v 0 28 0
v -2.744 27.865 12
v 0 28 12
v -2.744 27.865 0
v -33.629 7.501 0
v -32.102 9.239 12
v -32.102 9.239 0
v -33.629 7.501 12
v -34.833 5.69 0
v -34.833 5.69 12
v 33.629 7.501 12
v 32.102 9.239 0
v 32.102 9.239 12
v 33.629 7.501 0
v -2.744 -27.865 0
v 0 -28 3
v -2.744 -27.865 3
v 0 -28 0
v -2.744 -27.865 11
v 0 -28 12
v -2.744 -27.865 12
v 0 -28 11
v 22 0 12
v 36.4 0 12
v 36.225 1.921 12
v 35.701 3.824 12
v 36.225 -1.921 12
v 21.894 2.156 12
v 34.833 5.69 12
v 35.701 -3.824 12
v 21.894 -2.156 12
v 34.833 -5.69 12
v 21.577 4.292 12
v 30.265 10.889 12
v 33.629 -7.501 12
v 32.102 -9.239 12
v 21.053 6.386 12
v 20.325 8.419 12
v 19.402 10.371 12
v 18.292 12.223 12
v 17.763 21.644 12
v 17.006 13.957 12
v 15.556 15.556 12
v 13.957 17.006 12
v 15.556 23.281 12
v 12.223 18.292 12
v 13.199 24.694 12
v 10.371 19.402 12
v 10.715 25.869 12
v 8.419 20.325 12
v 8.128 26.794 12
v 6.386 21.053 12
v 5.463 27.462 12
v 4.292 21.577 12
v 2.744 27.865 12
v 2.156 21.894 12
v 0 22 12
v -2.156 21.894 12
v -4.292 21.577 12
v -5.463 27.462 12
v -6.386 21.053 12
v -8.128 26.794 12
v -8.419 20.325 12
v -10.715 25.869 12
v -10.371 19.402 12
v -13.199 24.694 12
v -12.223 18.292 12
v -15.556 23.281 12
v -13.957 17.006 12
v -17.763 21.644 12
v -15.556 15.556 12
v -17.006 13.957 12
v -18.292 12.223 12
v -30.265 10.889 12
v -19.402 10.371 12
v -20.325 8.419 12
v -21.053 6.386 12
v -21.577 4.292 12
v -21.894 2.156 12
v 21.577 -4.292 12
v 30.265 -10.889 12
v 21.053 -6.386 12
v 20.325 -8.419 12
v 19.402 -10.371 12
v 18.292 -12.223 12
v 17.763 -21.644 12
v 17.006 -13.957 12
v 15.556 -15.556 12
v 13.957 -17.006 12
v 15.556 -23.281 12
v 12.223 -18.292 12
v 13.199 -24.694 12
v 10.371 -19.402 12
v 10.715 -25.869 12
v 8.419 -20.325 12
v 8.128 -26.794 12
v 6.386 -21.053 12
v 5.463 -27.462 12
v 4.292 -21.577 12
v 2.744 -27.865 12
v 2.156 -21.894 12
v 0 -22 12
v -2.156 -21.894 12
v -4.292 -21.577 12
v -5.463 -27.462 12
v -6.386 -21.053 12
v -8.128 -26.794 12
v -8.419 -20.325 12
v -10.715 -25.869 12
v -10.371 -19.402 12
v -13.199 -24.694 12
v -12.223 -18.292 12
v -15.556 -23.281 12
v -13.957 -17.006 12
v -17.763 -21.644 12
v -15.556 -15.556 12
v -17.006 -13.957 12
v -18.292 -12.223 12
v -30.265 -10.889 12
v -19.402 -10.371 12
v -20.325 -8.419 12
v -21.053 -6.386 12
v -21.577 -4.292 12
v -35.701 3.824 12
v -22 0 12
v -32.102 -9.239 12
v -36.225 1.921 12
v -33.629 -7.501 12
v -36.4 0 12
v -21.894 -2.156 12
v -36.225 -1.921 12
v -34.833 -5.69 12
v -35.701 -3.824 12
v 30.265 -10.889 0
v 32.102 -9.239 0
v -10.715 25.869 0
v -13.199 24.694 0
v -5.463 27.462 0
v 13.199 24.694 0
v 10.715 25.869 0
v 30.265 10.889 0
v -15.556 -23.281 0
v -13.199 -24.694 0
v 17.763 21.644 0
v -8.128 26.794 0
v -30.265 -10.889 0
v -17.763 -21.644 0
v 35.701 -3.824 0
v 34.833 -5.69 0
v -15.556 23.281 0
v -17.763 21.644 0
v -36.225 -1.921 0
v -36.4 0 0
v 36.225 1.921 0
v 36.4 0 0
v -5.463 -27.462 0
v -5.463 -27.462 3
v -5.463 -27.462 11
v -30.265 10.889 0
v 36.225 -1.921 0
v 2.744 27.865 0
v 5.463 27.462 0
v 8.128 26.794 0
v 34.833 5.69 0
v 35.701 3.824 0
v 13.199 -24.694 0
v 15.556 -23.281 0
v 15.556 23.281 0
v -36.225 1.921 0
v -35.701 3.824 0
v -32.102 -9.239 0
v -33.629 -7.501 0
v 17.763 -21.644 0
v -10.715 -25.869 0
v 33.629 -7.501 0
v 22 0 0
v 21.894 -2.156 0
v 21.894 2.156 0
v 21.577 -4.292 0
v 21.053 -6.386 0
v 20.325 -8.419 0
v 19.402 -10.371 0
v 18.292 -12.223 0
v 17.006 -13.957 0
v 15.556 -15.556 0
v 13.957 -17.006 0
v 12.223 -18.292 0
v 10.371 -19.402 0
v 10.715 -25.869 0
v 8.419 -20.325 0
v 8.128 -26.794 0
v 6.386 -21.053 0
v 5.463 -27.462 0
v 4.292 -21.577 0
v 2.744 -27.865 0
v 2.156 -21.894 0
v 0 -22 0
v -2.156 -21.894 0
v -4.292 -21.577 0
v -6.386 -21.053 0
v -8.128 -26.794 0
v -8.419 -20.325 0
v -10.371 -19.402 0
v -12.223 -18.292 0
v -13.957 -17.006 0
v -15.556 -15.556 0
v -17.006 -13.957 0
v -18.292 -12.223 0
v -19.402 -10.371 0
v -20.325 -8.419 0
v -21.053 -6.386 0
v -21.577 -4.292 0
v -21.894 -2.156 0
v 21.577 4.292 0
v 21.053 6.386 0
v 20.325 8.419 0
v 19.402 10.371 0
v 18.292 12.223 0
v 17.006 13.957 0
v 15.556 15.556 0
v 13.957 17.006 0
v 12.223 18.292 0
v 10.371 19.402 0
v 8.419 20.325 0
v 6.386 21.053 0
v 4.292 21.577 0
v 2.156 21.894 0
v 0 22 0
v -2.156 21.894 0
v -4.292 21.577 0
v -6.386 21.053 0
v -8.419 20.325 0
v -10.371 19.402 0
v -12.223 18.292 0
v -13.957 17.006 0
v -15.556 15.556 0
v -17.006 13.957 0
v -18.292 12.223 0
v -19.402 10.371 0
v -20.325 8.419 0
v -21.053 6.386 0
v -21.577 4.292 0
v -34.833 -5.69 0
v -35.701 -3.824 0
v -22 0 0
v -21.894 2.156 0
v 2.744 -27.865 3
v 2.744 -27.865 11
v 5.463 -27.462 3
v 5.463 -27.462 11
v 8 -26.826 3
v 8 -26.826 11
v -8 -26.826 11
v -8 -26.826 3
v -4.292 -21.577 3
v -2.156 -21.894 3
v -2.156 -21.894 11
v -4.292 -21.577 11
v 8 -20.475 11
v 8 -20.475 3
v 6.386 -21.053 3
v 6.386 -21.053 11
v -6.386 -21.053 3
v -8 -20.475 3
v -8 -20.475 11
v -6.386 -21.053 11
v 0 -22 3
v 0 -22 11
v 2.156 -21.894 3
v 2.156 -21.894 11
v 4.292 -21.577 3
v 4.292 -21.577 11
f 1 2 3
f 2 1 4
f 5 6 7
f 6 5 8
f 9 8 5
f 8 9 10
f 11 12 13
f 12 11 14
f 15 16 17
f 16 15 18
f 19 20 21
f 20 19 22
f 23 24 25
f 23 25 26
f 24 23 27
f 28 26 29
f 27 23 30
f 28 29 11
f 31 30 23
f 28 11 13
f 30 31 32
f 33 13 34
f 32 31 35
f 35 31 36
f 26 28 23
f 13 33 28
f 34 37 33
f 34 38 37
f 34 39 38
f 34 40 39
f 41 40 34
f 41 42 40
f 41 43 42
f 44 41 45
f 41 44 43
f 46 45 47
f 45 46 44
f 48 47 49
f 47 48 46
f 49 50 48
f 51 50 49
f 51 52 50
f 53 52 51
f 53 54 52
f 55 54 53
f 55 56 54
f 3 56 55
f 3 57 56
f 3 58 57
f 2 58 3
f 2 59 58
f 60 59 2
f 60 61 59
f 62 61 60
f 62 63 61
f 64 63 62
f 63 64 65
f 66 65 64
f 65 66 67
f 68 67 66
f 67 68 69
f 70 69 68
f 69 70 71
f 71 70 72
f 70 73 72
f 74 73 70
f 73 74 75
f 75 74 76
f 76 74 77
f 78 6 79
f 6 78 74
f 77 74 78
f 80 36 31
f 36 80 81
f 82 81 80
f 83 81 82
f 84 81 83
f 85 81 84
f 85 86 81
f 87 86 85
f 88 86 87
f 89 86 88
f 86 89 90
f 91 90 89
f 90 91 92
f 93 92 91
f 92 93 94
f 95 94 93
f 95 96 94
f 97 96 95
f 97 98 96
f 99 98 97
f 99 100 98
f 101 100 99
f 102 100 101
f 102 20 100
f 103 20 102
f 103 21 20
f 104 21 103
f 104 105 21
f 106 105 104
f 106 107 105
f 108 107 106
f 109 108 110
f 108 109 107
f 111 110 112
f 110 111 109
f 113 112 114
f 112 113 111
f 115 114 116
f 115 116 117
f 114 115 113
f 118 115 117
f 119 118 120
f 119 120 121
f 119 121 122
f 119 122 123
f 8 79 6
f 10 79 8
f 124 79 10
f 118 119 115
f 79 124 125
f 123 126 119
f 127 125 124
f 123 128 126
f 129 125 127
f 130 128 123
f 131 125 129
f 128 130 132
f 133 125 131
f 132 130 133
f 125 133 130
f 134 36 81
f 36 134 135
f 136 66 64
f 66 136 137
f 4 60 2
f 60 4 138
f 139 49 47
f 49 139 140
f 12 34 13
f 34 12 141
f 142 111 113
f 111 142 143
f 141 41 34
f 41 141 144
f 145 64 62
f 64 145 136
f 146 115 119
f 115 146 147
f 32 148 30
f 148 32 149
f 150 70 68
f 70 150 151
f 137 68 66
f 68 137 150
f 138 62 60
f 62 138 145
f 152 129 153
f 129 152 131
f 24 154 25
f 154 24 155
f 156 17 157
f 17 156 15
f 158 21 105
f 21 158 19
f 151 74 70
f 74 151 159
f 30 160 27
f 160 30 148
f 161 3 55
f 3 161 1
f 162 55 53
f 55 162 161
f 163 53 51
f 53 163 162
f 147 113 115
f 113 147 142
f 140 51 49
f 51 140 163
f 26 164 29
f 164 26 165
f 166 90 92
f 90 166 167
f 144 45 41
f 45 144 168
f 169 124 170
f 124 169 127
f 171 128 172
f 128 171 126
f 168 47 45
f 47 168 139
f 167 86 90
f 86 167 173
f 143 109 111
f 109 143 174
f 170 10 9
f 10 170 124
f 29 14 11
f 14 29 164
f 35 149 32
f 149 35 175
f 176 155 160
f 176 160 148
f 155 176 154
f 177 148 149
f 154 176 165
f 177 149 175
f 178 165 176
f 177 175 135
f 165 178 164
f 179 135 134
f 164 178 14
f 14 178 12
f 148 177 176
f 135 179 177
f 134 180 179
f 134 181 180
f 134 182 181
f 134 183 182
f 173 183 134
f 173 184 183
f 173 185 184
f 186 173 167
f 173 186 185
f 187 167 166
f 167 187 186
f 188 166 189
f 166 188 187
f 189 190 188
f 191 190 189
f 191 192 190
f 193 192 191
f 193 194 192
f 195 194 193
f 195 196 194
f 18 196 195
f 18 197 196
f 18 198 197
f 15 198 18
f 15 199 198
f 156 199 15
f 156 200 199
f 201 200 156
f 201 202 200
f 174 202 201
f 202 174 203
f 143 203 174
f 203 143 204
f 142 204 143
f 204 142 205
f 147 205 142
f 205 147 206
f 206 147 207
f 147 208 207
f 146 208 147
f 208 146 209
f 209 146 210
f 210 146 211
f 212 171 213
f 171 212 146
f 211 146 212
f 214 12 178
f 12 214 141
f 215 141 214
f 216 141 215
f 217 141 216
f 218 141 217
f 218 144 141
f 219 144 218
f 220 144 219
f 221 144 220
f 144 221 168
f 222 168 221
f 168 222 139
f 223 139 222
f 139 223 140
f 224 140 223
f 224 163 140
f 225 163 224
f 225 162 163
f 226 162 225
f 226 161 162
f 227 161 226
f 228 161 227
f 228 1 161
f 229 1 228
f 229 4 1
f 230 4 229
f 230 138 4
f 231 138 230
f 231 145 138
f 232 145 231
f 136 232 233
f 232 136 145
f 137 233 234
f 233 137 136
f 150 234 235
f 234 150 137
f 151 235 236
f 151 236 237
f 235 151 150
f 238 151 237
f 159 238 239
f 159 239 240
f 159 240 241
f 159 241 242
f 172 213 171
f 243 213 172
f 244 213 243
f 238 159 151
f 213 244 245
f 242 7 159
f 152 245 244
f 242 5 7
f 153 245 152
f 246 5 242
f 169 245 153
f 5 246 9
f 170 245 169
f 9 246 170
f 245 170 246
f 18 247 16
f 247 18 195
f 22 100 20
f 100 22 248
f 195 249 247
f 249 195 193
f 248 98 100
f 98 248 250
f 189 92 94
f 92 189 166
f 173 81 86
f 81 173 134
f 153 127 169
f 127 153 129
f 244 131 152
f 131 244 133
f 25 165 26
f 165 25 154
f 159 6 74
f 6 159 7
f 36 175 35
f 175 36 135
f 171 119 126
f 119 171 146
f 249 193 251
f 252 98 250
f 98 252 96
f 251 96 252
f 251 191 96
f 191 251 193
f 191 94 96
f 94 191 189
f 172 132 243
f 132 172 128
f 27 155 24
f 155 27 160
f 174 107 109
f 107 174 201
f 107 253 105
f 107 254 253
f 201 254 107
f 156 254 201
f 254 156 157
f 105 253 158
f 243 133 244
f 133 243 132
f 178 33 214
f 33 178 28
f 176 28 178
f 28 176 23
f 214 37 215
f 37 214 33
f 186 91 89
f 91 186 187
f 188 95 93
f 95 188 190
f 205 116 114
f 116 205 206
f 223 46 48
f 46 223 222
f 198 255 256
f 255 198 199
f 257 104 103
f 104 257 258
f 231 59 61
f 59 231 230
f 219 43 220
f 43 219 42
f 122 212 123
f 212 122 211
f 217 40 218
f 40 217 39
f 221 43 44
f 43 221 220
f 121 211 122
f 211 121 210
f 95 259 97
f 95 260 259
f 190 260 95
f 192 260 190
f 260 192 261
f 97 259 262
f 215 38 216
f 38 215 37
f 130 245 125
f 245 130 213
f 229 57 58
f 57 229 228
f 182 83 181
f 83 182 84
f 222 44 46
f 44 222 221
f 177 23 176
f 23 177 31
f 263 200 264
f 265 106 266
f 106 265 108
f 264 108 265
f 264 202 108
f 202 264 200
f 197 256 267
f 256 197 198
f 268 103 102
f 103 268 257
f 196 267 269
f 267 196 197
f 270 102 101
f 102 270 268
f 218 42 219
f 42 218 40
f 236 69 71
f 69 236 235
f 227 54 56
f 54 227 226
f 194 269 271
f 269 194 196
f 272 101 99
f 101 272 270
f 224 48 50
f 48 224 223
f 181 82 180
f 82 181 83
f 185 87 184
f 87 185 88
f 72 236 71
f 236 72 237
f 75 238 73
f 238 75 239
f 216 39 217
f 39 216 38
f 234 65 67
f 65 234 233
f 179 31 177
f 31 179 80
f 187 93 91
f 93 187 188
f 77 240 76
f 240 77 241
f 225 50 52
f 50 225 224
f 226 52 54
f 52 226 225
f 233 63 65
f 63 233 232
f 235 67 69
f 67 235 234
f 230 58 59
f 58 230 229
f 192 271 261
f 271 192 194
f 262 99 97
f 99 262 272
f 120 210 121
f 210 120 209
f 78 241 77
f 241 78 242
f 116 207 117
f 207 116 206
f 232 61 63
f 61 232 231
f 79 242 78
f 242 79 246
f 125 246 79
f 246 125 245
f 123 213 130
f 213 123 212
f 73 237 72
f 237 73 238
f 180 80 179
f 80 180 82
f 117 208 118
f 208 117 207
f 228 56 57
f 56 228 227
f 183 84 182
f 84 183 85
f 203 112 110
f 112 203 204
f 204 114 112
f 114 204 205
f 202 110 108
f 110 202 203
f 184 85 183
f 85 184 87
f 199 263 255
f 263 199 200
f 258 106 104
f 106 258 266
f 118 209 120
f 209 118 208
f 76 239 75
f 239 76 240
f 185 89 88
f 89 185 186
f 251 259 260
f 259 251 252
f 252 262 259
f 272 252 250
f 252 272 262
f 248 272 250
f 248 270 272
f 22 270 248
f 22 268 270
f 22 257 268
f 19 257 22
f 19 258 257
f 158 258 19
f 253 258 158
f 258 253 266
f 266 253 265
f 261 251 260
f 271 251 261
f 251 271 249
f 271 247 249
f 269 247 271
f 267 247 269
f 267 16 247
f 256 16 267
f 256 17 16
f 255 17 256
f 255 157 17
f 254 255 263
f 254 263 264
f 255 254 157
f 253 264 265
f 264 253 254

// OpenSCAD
$fn=64;
difference(){
  hull(){ cylinder(h=12,r=28); translate([0,0,0]) scale([1.3,0.7,1]) cylinder(h=12,r=28); }
  translate([0,0,-0.1]) cylinder(h=13,r=22);
  translate([-8,-40,3]) cube([16,20,8]);
}
